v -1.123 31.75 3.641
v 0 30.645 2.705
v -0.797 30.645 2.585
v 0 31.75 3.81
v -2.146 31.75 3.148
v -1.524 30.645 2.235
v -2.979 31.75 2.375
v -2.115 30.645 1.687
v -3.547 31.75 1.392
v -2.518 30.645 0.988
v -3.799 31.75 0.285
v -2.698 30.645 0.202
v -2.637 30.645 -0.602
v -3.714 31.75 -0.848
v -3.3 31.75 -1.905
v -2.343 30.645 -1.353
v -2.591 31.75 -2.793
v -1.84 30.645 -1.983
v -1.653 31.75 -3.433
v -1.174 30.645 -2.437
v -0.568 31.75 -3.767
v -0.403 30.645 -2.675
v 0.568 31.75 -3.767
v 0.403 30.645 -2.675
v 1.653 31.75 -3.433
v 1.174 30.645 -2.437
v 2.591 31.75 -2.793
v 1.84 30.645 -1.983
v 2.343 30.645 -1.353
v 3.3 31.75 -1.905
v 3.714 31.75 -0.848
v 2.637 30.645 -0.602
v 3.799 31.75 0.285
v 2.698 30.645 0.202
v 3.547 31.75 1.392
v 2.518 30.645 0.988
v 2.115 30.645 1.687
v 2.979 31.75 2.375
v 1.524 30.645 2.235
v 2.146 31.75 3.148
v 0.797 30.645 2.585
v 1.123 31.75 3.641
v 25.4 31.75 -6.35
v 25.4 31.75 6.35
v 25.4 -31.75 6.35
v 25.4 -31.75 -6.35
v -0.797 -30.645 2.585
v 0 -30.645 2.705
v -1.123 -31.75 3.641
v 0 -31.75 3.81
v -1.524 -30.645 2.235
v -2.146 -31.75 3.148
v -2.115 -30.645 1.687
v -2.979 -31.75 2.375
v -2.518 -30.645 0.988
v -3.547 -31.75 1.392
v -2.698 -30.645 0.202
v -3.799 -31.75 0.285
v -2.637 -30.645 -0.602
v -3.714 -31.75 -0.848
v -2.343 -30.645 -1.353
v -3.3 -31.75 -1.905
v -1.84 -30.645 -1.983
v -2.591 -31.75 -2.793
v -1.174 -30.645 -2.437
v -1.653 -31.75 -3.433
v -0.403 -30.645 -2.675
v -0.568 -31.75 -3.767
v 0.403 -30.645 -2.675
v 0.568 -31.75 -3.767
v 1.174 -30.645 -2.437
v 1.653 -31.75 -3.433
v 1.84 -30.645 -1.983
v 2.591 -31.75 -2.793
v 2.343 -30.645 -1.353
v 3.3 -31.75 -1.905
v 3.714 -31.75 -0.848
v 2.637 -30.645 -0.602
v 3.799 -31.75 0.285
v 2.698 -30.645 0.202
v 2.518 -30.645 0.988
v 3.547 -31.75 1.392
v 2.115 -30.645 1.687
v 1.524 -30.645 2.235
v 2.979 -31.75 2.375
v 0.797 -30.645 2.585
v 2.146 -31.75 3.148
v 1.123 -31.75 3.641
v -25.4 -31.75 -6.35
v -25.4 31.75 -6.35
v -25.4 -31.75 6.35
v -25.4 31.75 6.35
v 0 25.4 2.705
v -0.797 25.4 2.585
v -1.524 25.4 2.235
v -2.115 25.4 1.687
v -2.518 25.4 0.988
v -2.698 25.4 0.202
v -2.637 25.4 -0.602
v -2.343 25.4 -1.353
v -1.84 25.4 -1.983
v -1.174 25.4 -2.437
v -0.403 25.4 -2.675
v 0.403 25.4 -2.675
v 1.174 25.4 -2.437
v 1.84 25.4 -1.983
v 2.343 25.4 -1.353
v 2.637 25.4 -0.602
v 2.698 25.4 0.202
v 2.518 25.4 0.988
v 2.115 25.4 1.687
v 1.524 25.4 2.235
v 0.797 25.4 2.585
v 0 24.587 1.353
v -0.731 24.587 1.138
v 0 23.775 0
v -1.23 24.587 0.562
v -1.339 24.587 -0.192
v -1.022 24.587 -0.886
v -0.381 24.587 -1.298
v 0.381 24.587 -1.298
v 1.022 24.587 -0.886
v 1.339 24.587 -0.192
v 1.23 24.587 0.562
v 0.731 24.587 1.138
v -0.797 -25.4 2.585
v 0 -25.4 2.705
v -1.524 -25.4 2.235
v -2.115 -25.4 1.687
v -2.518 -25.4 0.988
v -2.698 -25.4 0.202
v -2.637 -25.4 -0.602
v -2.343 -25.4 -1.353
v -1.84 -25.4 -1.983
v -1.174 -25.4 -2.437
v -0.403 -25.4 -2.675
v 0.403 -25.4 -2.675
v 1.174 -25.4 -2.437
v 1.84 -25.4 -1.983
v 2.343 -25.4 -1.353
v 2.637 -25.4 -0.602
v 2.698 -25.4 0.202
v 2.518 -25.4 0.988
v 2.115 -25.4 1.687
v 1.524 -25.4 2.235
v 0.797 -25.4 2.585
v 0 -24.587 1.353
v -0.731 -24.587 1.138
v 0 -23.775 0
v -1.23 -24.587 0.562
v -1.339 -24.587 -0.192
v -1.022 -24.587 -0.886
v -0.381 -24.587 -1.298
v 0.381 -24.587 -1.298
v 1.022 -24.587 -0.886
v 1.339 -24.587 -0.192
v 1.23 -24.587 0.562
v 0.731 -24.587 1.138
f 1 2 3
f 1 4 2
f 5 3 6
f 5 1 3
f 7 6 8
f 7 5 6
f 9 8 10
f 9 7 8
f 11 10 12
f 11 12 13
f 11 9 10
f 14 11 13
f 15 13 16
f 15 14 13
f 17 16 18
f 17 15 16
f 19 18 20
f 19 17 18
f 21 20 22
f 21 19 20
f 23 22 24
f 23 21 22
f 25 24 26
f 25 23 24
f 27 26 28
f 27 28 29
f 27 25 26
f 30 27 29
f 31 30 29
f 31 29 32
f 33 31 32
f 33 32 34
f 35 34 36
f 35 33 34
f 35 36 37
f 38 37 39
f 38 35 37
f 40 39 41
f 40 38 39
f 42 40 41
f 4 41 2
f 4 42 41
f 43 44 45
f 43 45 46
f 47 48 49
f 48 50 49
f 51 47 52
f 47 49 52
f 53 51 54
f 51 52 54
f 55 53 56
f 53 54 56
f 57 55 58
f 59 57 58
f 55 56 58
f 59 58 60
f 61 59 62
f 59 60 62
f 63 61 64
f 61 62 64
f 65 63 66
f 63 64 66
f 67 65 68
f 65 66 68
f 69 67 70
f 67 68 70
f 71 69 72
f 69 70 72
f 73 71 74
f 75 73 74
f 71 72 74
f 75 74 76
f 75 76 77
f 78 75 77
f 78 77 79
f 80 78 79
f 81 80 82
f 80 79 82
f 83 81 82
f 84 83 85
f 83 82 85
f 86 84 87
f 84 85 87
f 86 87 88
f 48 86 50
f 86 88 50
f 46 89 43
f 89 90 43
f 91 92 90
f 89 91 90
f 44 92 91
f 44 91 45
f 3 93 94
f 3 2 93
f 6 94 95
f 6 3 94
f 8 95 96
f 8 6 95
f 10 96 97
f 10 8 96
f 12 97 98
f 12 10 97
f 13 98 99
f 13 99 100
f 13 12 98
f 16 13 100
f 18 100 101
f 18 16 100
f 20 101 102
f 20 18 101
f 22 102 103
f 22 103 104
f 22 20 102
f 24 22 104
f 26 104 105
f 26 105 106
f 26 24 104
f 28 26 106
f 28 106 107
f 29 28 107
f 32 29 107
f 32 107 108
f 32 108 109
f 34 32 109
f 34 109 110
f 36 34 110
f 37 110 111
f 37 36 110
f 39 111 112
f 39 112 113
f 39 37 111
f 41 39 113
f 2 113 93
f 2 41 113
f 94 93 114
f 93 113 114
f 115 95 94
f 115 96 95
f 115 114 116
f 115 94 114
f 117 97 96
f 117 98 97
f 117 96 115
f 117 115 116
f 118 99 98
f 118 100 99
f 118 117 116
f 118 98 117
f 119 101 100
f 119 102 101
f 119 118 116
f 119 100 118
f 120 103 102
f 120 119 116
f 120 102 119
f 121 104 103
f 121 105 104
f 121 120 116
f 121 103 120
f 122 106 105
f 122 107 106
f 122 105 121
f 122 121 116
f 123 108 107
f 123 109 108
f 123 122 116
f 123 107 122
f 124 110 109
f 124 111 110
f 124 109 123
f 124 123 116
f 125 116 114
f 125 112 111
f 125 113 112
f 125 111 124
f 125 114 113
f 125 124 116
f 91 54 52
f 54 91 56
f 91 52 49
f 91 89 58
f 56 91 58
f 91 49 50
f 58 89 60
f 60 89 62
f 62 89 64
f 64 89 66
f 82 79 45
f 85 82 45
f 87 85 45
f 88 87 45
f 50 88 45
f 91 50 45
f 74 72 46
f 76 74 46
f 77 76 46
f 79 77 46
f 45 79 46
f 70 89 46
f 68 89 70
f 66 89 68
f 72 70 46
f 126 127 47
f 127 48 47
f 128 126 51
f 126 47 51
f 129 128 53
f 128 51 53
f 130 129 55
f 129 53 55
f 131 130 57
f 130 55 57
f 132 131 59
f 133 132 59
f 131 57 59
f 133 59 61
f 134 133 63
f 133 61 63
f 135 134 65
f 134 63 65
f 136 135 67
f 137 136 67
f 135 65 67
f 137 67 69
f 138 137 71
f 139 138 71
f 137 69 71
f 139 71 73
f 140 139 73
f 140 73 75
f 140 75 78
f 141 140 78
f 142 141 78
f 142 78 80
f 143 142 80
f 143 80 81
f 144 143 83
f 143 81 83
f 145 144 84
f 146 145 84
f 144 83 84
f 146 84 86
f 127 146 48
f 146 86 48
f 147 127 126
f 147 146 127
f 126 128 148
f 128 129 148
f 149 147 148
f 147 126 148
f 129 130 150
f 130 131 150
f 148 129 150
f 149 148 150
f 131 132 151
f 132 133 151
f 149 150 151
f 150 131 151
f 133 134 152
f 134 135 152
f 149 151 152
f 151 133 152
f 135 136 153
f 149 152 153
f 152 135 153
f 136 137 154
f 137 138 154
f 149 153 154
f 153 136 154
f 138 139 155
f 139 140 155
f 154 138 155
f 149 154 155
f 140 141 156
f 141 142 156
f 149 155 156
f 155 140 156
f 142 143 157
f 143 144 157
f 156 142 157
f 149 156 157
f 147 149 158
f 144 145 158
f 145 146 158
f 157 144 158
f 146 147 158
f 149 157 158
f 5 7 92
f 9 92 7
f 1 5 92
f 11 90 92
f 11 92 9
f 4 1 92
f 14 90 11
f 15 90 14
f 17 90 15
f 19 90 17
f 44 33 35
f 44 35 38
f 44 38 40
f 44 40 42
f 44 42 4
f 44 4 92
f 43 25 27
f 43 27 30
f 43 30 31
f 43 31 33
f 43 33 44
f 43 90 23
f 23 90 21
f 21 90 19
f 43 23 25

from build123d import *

# Parameters (mm, degrees)
SKETCH1_W           = 50.8
SKETCH1_H           = 12.7
BOSS_EXTRUDE1_DEPTH = 31.75


with BuildPart() as part:
    # Sketch1 → Boss-Extrude1 (new body, symmetric)
    with BuildSketch(Plane(origin=(0, 0, 0), x_dir=(1, 0, 0), z_dir=(0, 1, 0))):
        Rectangle(SKETCH1_W, SKETCH1_H)
    extrude(amount=BOSS_EXTRUDE1_DEPTH, both=True)

    # Sketch3 → 1/4-28 Tapped Hole1 (revolve, cut)
    with BuildSketch(Plane(origin=(0, 31.75, 0), x_dir=(0, 0, 1), z_dir=(1, 0, 0))):
        Polygon((0, 0), (0, 7.975388061), (2.7051, 6.35), (2.7051, 1.1049), (3.81, 0), align=None)
    f_1_4_28_tapped_hole1 = revolve(axis=Axis((0, 38.1, 0), (0, -1, 0)), mode=Mode.SUBTRACT)

    # Mirror1: 1/4-28 Tapped Hole1 across plane
    add(f_1_4_28_tapped_hole1.mirror(Plane.ZX), mode=Mode.SUBTRACT)


solid = part.part
